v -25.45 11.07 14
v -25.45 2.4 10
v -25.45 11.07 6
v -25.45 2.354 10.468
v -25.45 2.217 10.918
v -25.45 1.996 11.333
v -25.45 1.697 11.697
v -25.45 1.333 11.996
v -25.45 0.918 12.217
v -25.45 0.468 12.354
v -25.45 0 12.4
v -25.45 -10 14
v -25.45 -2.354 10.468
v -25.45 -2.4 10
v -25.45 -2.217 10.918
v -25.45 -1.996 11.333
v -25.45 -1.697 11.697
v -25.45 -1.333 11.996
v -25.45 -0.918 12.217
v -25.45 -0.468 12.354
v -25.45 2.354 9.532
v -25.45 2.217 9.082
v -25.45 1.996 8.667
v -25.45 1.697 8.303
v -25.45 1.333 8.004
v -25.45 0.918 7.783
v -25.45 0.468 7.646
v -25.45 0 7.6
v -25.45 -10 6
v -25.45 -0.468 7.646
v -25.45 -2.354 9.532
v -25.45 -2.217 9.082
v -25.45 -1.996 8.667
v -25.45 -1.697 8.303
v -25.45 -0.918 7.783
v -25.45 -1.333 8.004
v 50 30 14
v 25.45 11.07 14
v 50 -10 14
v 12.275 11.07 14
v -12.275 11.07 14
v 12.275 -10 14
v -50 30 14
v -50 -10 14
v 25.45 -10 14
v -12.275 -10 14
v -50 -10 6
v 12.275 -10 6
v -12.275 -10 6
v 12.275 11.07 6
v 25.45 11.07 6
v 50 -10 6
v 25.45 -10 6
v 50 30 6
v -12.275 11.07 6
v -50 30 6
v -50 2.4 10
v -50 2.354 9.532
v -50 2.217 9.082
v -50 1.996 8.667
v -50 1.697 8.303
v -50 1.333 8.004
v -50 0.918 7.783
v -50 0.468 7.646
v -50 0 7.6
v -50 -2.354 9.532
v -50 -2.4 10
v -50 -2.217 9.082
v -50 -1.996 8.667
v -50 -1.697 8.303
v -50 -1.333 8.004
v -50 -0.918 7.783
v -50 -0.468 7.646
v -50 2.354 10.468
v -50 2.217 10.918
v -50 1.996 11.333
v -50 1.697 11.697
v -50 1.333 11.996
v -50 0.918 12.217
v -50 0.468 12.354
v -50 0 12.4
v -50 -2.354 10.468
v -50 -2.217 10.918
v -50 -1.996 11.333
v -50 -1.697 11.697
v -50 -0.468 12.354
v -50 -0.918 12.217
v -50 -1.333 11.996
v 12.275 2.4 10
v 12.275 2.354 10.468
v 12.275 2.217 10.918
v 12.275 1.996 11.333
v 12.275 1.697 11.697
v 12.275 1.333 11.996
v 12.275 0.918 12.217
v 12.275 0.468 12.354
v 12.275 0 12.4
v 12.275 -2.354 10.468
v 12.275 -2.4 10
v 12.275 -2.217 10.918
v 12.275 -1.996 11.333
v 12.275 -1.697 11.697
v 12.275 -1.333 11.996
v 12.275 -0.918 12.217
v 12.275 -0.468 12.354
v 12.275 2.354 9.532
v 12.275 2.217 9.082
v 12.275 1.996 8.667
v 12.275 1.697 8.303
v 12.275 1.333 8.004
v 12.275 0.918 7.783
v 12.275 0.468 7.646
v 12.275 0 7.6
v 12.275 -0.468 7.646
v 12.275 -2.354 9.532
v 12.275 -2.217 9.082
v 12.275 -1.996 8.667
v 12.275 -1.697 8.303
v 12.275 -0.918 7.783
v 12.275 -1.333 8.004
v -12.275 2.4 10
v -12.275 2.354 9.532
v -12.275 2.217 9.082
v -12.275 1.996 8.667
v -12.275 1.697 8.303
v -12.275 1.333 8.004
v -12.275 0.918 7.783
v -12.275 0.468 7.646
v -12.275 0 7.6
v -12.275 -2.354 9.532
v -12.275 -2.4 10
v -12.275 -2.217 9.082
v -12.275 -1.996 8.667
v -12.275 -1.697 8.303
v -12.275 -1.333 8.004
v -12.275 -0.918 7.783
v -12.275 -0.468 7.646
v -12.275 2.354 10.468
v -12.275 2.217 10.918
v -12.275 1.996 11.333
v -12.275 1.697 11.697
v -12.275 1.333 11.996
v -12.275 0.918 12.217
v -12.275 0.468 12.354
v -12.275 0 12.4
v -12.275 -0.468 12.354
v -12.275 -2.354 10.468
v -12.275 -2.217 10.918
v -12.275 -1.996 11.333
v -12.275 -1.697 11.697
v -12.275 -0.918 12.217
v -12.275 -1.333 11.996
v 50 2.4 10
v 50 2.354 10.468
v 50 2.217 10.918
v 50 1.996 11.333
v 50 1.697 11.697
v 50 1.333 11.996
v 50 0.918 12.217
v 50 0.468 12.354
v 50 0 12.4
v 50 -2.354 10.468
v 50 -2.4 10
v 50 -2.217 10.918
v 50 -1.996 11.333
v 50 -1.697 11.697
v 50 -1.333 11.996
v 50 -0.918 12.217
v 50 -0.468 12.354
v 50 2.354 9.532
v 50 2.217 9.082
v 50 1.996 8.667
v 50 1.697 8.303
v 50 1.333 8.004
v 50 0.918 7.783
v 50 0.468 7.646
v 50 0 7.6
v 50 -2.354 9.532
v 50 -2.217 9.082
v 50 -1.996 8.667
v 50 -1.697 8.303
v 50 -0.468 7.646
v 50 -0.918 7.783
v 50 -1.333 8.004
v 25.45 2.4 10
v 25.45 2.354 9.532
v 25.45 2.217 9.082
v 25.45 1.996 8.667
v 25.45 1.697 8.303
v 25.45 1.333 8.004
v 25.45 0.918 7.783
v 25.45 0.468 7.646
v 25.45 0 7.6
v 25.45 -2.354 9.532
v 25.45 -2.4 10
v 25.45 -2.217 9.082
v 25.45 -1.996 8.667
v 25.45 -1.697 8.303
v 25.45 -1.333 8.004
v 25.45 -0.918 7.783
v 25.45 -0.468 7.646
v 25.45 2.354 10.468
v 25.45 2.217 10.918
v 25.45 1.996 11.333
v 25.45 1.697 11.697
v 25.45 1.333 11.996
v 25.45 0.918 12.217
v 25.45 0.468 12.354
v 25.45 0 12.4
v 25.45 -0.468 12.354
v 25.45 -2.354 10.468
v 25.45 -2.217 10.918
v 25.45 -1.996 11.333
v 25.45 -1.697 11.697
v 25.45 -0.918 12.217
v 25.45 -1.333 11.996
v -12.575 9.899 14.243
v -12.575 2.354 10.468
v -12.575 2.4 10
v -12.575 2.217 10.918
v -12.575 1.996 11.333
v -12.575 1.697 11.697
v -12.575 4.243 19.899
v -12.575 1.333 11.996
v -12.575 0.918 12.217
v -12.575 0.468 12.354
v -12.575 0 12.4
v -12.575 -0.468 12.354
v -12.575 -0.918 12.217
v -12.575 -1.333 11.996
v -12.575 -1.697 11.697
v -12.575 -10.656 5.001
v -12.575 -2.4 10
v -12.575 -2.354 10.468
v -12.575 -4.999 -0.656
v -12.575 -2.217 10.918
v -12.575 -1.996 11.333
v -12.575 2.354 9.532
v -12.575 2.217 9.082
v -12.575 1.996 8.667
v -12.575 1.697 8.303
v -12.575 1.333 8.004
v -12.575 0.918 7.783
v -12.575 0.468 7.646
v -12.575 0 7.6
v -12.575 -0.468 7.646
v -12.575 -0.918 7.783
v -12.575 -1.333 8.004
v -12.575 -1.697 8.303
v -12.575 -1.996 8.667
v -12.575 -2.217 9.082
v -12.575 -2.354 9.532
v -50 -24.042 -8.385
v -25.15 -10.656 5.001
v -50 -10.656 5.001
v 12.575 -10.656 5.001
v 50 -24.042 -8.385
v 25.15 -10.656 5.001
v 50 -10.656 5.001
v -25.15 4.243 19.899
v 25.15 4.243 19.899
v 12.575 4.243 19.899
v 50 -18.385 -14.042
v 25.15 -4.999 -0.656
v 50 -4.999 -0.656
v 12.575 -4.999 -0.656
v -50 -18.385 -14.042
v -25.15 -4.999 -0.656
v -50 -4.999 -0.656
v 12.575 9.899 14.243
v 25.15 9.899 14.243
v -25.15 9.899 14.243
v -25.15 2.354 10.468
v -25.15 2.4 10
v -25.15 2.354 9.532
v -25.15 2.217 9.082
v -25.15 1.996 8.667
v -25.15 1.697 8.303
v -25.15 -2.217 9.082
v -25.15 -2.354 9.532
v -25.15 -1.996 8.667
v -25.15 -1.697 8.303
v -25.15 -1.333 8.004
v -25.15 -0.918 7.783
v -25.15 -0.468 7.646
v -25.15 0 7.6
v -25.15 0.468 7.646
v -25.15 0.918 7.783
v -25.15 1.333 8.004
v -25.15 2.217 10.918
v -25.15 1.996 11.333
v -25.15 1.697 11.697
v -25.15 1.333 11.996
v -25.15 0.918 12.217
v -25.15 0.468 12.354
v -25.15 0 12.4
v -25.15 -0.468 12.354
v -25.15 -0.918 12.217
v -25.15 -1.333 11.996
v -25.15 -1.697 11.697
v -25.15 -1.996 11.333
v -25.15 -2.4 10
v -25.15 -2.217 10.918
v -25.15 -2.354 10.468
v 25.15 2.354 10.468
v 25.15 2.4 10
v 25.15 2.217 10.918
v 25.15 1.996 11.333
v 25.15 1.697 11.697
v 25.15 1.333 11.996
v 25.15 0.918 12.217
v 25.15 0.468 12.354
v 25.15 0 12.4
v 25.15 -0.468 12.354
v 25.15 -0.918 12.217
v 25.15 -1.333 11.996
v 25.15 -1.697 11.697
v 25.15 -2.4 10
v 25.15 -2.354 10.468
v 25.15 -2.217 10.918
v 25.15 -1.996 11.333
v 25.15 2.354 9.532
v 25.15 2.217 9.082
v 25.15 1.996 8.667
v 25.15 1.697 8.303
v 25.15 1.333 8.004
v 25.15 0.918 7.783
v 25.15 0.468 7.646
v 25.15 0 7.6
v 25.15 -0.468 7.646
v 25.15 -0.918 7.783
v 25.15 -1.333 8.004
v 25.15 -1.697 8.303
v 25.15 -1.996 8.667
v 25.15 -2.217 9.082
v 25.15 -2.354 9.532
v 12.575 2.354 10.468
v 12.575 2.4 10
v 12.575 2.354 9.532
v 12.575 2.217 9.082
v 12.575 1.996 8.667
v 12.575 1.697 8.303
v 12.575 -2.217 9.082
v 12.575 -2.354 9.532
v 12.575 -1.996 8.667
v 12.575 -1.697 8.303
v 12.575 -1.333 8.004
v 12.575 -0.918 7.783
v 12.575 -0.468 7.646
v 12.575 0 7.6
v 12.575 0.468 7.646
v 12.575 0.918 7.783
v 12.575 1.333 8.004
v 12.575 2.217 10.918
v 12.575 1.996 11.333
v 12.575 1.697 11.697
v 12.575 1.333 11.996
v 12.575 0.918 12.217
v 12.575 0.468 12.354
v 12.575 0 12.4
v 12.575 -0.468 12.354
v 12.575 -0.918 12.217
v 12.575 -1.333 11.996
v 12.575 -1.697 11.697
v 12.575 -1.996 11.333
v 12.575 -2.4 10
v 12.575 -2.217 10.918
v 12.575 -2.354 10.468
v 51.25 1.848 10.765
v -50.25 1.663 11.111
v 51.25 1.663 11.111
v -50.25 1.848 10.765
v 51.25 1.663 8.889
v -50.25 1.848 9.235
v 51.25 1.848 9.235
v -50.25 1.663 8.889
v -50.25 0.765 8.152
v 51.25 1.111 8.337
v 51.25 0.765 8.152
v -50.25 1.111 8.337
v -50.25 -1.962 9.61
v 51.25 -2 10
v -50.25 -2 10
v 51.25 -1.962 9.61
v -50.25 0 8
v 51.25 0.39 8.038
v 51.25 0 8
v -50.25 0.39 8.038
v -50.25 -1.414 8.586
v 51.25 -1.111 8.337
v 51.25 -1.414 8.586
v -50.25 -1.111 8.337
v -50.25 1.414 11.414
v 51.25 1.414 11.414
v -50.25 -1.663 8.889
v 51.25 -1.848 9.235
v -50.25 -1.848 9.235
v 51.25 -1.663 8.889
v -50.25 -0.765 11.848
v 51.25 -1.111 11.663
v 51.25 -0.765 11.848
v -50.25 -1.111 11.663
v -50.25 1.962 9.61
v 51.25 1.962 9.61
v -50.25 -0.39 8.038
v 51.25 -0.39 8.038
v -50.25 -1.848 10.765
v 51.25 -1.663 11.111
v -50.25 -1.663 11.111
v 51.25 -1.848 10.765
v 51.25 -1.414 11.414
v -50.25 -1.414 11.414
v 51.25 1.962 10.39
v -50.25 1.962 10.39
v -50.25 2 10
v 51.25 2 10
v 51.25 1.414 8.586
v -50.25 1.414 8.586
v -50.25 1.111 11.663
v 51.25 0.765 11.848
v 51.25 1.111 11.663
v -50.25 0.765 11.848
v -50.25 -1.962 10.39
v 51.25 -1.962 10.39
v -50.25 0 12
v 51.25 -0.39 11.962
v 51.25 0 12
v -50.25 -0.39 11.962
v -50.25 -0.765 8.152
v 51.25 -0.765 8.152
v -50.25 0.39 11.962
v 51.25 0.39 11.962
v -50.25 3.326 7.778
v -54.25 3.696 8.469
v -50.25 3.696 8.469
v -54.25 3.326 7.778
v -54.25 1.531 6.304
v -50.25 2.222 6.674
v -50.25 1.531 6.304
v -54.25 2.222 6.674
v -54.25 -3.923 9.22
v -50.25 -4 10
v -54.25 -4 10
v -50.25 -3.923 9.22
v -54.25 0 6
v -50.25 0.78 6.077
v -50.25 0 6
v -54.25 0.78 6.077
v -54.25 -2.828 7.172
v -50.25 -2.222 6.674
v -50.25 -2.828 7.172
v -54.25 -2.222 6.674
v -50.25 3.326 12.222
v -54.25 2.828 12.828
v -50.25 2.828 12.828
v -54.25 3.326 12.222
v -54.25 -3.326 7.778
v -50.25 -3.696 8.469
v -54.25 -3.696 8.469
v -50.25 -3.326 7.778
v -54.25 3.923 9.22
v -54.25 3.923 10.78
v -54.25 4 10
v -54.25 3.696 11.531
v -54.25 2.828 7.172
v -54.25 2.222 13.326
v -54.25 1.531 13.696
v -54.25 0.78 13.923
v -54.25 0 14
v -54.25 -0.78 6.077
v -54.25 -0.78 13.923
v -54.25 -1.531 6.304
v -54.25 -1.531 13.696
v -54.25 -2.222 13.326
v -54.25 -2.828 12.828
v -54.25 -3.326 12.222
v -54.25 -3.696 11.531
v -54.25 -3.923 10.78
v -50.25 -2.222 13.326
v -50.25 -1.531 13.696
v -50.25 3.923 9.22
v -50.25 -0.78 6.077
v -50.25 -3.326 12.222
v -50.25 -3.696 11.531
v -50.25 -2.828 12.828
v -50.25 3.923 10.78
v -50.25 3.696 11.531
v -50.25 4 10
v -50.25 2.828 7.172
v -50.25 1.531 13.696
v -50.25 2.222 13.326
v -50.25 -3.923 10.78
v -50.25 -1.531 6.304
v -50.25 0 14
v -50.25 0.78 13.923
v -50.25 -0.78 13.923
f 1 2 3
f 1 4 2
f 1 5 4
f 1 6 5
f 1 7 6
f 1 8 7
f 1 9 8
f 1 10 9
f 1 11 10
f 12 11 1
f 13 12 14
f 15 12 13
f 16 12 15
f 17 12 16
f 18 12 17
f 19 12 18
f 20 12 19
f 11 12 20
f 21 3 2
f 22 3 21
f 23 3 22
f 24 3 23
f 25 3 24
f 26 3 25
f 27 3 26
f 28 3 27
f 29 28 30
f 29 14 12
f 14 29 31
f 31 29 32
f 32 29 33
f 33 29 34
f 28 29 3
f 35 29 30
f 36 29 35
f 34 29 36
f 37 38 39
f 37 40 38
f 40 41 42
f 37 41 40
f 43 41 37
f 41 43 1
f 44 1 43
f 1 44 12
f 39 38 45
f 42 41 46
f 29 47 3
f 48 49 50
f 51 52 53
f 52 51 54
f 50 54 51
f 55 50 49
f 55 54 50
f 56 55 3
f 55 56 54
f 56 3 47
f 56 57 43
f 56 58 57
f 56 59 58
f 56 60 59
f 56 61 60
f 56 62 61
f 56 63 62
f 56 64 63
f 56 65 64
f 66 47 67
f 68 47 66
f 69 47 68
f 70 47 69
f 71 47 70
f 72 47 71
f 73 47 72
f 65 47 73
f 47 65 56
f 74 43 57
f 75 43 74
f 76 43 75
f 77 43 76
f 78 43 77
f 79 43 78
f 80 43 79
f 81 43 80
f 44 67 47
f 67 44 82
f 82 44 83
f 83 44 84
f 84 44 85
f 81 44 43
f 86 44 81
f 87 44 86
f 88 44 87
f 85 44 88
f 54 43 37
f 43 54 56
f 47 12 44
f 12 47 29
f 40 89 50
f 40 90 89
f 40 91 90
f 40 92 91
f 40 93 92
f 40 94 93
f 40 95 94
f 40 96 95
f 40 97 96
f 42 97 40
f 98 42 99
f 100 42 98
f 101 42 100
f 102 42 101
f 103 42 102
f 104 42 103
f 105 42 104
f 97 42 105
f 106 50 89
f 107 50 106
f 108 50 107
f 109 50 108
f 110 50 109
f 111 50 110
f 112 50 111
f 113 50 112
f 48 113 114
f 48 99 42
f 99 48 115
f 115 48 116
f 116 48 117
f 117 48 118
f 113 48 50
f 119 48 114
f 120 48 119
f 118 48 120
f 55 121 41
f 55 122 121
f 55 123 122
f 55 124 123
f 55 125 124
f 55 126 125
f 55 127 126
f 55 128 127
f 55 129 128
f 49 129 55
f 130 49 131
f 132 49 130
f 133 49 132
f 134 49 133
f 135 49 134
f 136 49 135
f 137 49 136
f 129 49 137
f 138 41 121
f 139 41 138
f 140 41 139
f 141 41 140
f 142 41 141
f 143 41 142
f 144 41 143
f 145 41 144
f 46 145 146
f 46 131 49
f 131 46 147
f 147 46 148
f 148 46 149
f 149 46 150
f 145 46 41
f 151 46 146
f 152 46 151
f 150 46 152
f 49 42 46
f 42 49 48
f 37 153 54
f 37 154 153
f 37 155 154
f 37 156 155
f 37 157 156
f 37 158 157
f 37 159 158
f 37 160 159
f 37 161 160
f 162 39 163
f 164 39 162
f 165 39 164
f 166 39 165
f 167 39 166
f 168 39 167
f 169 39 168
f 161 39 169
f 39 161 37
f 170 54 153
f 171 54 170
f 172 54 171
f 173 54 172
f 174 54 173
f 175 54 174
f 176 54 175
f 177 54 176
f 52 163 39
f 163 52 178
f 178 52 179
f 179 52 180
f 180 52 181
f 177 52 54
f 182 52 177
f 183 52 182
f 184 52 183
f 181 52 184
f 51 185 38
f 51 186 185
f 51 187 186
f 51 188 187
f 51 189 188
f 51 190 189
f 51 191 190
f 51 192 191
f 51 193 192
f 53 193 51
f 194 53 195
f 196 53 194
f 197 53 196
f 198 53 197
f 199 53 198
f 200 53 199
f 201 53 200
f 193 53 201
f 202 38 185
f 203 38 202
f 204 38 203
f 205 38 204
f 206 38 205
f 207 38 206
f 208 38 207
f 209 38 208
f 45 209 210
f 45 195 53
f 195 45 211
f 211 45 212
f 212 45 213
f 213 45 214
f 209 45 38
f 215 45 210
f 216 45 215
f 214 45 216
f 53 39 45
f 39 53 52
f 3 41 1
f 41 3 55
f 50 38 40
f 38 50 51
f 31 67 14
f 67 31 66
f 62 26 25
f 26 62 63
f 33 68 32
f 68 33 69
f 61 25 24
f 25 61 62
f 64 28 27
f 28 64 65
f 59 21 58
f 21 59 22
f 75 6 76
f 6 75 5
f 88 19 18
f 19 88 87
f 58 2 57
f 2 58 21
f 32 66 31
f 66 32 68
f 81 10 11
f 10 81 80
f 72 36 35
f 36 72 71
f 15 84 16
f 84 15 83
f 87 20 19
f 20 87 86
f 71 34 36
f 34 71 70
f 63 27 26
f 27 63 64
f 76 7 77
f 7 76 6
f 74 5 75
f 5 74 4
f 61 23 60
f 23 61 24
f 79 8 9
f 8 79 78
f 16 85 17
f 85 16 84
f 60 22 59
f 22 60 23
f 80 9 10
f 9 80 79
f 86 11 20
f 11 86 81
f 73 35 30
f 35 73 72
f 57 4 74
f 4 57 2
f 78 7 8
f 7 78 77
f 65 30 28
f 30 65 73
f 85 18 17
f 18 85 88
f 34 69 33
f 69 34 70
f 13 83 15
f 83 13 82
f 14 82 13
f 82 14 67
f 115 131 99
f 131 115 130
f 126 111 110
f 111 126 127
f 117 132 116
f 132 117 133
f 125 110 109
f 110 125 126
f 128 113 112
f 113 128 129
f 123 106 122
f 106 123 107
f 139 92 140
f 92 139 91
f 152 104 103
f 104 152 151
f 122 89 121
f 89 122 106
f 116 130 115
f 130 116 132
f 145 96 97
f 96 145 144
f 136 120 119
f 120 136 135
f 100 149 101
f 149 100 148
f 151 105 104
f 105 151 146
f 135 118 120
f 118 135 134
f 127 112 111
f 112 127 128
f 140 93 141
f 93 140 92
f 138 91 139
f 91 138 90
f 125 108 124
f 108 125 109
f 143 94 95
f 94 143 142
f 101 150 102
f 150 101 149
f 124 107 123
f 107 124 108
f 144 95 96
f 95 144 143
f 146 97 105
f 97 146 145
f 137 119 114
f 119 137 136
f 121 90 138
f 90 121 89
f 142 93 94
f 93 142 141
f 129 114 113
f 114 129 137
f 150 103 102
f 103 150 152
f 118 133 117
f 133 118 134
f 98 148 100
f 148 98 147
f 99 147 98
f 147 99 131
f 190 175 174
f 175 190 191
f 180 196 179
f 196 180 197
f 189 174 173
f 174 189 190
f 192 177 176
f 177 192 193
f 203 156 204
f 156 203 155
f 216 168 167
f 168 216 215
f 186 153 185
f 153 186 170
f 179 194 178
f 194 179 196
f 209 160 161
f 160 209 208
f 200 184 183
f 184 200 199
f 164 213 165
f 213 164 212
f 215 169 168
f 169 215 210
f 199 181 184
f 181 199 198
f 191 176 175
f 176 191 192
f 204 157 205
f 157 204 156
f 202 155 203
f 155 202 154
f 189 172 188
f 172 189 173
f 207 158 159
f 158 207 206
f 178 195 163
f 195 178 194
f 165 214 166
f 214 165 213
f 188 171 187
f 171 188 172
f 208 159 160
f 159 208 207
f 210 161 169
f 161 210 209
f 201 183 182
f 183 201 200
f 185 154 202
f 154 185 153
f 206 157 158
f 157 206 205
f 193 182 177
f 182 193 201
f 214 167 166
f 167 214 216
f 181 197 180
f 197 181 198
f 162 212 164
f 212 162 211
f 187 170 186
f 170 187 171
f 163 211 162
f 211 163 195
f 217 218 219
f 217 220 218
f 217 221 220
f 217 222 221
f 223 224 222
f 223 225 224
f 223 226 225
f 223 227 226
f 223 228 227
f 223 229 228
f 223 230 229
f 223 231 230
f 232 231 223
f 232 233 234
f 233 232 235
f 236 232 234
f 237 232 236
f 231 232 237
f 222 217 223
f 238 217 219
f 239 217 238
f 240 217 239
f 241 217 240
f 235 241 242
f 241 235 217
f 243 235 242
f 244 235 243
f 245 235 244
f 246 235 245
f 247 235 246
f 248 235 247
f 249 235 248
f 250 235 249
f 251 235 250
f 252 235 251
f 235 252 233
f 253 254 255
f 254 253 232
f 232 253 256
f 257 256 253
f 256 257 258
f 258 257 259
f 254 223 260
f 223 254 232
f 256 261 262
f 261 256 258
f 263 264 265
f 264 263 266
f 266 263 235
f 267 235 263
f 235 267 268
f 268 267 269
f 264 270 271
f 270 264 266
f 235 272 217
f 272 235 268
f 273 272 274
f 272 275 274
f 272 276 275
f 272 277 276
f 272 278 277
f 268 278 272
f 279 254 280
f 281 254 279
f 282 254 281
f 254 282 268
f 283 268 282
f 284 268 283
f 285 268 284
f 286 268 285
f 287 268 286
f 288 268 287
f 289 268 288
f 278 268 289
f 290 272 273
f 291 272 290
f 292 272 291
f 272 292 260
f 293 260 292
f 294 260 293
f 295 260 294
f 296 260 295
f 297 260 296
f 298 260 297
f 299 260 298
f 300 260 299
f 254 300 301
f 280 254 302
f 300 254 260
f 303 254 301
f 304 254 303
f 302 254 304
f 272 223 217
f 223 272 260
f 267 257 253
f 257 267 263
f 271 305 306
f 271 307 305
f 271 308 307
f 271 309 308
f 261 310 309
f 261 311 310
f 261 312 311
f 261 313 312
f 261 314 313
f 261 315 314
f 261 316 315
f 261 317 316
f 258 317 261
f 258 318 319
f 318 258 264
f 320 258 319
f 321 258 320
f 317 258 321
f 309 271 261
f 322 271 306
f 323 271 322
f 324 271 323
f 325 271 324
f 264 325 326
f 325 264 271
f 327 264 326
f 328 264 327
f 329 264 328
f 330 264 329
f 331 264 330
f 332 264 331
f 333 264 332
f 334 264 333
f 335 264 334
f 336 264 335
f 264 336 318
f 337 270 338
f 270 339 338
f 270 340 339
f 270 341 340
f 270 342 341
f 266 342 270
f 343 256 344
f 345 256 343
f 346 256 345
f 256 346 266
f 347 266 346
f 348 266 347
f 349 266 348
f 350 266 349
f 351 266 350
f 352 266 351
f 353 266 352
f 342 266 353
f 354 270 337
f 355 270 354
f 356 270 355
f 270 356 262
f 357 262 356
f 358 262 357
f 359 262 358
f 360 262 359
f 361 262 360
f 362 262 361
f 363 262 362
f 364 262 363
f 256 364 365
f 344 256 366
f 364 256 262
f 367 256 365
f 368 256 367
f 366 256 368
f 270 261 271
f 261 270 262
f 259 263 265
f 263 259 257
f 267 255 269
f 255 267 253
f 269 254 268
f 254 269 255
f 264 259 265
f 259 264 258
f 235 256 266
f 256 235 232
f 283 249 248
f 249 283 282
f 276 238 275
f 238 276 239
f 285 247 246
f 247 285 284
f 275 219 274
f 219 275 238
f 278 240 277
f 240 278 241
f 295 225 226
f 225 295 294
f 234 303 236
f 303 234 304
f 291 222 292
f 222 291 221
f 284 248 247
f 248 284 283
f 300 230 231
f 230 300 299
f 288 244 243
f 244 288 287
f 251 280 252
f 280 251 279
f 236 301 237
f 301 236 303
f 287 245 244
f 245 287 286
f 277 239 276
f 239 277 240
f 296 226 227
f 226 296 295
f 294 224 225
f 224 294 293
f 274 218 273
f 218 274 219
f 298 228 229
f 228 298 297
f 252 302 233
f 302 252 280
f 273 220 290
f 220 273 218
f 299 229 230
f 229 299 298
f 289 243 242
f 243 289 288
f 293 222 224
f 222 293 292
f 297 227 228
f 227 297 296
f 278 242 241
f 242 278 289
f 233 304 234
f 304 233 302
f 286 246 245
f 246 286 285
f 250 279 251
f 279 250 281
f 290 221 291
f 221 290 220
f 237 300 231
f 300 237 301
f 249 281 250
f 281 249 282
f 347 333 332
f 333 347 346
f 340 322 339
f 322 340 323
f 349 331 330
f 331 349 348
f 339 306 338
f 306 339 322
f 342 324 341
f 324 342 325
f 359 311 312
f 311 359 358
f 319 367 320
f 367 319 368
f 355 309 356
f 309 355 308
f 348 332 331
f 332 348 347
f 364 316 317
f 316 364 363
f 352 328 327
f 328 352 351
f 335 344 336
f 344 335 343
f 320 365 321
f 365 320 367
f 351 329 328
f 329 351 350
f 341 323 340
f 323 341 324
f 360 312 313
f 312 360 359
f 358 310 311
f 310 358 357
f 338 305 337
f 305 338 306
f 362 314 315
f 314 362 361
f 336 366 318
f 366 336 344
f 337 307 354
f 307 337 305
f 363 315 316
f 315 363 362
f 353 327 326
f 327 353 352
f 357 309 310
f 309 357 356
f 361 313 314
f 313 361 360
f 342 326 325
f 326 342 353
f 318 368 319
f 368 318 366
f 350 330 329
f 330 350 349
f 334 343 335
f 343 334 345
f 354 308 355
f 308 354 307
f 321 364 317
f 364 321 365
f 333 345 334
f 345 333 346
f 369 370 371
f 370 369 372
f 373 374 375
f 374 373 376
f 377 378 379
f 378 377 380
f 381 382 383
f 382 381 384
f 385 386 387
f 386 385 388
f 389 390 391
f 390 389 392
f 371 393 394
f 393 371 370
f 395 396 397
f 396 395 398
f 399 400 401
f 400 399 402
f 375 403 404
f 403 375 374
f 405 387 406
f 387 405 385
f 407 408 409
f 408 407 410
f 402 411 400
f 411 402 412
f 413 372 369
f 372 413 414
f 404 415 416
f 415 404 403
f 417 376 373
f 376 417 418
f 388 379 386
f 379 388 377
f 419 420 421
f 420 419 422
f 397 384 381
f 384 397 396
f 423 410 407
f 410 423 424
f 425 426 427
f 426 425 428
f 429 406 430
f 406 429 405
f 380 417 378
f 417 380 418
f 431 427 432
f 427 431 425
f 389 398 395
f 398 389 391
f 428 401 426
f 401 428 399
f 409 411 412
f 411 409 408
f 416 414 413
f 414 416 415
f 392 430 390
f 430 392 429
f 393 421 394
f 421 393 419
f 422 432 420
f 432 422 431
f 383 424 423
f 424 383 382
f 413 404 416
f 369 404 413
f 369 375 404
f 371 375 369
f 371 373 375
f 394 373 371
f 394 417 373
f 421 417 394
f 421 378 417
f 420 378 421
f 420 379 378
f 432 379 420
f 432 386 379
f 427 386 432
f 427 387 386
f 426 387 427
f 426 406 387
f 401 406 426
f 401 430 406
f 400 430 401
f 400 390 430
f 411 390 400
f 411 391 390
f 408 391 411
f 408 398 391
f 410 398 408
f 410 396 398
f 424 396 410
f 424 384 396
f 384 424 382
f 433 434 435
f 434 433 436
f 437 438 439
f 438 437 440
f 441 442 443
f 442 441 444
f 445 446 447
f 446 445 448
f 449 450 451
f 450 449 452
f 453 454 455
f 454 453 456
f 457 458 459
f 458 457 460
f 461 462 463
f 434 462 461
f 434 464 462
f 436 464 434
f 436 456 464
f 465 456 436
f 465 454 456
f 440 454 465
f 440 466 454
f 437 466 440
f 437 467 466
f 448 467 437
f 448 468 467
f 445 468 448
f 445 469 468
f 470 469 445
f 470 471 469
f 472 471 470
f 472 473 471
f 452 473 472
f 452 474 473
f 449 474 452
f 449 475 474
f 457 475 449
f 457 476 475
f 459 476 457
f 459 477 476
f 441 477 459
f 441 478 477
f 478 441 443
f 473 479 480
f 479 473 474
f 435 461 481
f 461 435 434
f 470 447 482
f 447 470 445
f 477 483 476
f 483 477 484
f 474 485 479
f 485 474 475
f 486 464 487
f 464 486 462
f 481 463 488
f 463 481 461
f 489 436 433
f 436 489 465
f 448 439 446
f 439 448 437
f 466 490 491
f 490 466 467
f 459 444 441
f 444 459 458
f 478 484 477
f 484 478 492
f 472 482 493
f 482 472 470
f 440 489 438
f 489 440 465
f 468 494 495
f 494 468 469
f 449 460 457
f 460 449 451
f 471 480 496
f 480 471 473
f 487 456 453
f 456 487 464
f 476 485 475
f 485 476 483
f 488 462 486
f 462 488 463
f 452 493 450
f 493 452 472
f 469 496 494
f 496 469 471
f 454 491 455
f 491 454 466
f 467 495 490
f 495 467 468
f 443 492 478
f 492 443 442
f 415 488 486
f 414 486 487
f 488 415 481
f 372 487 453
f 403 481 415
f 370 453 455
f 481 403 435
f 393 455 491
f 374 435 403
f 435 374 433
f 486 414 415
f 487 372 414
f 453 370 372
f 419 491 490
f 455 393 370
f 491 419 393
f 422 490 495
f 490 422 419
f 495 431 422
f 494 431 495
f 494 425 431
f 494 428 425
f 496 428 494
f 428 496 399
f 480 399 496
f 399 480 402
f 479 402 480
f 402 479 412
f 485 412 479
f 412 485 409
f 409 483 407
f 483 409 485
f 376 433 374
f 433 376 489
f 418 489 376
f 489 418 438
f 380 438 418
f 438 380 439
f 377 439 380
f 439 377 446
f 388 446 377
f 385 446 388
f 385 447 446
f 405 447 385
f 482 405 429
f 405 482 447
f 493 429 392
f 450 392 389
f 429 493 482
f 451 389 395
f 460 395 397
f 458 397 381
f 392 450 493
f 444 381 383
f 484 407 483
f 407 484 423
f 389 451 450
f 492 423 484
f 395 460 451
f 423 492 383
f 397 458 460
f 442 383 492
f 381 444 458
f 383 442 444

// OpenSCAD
$fn = 32;

// ------------------------------------------------------------------------
// Butt hinge: hinge 100 mm, leaf swung 45 deg
// Every part is its own module, assembly() places every instance.
// ------------------------------------------------------------------------

// --- part 1 ---
module hinge_base() {
  difference() {
    union() {
      translate([-50, -10, -4]) cube([24.55, 40, 8]);
      translate([-12.275, -10, -4]) cube([24.55, 40, 8]);
      translate([25.45, -10, -4]) cube([24.55, 40, 8]);
      translate([-50, 11.07, -4]) cube([100, 18.93, 8]);
    }
    translate([-37.725, 0, 0]) rotate([0, 90, 0]) cylinder(h = 26.55, d = 4.8, center = true);
    translate([0, 0, 0]) rotate([0, 90, 0]) cylinder(h = 26.55, d = 4.8, center = true);
    translate([37.725, 0, 0]) rotate([0, 90, 0]) cylinder(h = 26.55, d = 4.8, center = true);
  }
}

// --- part 2 ---
module hinge_mover() {
  difference() {
    union() {
      translate([-25.15, -30, -4]) cube([12.575, 40, 8]);
      translate([12.575, -30, -4]) cube([12.575, 40, 8]);
      translate([-50, -30, -4]) cube([100, 18.93, 8]);
    }
    translate([-18.863, 0, 0]) rotate([0, 90, 0]) cylinder(h = 14.575, d = 4.8, center = true);
    translate([18.863, 0, 0]) rotate([0, 90, 0]) cylinder(h = 14.575, d = 4.8, center = true);
  }
}

// --- part 3 ---
module hinge_pin() {
  rotate([0, 90, 0]) cylinder(h = 102.5, d = 4, center = true);
  translate([-54.25, 0, 0]) rotate([0, 90, 0]) cylinder(h = 4, d = 8);
}

// --- assembly ---
module assembly() {
  color([0.80, 0.24, 0.20]) translate([0, 0, 10]) rotate([0, 0, 0]) hinge_base();
  color([0.20, 0.45, 0.75]) translate([0, 0, 10]) rotate([45, 0, 0]) hinge_mover();
  color([0.25, 0.62, 0.32]) translate([0, 0, 10]) rotate([0, 0, 0]) hinge_pin();
}

assembly();
